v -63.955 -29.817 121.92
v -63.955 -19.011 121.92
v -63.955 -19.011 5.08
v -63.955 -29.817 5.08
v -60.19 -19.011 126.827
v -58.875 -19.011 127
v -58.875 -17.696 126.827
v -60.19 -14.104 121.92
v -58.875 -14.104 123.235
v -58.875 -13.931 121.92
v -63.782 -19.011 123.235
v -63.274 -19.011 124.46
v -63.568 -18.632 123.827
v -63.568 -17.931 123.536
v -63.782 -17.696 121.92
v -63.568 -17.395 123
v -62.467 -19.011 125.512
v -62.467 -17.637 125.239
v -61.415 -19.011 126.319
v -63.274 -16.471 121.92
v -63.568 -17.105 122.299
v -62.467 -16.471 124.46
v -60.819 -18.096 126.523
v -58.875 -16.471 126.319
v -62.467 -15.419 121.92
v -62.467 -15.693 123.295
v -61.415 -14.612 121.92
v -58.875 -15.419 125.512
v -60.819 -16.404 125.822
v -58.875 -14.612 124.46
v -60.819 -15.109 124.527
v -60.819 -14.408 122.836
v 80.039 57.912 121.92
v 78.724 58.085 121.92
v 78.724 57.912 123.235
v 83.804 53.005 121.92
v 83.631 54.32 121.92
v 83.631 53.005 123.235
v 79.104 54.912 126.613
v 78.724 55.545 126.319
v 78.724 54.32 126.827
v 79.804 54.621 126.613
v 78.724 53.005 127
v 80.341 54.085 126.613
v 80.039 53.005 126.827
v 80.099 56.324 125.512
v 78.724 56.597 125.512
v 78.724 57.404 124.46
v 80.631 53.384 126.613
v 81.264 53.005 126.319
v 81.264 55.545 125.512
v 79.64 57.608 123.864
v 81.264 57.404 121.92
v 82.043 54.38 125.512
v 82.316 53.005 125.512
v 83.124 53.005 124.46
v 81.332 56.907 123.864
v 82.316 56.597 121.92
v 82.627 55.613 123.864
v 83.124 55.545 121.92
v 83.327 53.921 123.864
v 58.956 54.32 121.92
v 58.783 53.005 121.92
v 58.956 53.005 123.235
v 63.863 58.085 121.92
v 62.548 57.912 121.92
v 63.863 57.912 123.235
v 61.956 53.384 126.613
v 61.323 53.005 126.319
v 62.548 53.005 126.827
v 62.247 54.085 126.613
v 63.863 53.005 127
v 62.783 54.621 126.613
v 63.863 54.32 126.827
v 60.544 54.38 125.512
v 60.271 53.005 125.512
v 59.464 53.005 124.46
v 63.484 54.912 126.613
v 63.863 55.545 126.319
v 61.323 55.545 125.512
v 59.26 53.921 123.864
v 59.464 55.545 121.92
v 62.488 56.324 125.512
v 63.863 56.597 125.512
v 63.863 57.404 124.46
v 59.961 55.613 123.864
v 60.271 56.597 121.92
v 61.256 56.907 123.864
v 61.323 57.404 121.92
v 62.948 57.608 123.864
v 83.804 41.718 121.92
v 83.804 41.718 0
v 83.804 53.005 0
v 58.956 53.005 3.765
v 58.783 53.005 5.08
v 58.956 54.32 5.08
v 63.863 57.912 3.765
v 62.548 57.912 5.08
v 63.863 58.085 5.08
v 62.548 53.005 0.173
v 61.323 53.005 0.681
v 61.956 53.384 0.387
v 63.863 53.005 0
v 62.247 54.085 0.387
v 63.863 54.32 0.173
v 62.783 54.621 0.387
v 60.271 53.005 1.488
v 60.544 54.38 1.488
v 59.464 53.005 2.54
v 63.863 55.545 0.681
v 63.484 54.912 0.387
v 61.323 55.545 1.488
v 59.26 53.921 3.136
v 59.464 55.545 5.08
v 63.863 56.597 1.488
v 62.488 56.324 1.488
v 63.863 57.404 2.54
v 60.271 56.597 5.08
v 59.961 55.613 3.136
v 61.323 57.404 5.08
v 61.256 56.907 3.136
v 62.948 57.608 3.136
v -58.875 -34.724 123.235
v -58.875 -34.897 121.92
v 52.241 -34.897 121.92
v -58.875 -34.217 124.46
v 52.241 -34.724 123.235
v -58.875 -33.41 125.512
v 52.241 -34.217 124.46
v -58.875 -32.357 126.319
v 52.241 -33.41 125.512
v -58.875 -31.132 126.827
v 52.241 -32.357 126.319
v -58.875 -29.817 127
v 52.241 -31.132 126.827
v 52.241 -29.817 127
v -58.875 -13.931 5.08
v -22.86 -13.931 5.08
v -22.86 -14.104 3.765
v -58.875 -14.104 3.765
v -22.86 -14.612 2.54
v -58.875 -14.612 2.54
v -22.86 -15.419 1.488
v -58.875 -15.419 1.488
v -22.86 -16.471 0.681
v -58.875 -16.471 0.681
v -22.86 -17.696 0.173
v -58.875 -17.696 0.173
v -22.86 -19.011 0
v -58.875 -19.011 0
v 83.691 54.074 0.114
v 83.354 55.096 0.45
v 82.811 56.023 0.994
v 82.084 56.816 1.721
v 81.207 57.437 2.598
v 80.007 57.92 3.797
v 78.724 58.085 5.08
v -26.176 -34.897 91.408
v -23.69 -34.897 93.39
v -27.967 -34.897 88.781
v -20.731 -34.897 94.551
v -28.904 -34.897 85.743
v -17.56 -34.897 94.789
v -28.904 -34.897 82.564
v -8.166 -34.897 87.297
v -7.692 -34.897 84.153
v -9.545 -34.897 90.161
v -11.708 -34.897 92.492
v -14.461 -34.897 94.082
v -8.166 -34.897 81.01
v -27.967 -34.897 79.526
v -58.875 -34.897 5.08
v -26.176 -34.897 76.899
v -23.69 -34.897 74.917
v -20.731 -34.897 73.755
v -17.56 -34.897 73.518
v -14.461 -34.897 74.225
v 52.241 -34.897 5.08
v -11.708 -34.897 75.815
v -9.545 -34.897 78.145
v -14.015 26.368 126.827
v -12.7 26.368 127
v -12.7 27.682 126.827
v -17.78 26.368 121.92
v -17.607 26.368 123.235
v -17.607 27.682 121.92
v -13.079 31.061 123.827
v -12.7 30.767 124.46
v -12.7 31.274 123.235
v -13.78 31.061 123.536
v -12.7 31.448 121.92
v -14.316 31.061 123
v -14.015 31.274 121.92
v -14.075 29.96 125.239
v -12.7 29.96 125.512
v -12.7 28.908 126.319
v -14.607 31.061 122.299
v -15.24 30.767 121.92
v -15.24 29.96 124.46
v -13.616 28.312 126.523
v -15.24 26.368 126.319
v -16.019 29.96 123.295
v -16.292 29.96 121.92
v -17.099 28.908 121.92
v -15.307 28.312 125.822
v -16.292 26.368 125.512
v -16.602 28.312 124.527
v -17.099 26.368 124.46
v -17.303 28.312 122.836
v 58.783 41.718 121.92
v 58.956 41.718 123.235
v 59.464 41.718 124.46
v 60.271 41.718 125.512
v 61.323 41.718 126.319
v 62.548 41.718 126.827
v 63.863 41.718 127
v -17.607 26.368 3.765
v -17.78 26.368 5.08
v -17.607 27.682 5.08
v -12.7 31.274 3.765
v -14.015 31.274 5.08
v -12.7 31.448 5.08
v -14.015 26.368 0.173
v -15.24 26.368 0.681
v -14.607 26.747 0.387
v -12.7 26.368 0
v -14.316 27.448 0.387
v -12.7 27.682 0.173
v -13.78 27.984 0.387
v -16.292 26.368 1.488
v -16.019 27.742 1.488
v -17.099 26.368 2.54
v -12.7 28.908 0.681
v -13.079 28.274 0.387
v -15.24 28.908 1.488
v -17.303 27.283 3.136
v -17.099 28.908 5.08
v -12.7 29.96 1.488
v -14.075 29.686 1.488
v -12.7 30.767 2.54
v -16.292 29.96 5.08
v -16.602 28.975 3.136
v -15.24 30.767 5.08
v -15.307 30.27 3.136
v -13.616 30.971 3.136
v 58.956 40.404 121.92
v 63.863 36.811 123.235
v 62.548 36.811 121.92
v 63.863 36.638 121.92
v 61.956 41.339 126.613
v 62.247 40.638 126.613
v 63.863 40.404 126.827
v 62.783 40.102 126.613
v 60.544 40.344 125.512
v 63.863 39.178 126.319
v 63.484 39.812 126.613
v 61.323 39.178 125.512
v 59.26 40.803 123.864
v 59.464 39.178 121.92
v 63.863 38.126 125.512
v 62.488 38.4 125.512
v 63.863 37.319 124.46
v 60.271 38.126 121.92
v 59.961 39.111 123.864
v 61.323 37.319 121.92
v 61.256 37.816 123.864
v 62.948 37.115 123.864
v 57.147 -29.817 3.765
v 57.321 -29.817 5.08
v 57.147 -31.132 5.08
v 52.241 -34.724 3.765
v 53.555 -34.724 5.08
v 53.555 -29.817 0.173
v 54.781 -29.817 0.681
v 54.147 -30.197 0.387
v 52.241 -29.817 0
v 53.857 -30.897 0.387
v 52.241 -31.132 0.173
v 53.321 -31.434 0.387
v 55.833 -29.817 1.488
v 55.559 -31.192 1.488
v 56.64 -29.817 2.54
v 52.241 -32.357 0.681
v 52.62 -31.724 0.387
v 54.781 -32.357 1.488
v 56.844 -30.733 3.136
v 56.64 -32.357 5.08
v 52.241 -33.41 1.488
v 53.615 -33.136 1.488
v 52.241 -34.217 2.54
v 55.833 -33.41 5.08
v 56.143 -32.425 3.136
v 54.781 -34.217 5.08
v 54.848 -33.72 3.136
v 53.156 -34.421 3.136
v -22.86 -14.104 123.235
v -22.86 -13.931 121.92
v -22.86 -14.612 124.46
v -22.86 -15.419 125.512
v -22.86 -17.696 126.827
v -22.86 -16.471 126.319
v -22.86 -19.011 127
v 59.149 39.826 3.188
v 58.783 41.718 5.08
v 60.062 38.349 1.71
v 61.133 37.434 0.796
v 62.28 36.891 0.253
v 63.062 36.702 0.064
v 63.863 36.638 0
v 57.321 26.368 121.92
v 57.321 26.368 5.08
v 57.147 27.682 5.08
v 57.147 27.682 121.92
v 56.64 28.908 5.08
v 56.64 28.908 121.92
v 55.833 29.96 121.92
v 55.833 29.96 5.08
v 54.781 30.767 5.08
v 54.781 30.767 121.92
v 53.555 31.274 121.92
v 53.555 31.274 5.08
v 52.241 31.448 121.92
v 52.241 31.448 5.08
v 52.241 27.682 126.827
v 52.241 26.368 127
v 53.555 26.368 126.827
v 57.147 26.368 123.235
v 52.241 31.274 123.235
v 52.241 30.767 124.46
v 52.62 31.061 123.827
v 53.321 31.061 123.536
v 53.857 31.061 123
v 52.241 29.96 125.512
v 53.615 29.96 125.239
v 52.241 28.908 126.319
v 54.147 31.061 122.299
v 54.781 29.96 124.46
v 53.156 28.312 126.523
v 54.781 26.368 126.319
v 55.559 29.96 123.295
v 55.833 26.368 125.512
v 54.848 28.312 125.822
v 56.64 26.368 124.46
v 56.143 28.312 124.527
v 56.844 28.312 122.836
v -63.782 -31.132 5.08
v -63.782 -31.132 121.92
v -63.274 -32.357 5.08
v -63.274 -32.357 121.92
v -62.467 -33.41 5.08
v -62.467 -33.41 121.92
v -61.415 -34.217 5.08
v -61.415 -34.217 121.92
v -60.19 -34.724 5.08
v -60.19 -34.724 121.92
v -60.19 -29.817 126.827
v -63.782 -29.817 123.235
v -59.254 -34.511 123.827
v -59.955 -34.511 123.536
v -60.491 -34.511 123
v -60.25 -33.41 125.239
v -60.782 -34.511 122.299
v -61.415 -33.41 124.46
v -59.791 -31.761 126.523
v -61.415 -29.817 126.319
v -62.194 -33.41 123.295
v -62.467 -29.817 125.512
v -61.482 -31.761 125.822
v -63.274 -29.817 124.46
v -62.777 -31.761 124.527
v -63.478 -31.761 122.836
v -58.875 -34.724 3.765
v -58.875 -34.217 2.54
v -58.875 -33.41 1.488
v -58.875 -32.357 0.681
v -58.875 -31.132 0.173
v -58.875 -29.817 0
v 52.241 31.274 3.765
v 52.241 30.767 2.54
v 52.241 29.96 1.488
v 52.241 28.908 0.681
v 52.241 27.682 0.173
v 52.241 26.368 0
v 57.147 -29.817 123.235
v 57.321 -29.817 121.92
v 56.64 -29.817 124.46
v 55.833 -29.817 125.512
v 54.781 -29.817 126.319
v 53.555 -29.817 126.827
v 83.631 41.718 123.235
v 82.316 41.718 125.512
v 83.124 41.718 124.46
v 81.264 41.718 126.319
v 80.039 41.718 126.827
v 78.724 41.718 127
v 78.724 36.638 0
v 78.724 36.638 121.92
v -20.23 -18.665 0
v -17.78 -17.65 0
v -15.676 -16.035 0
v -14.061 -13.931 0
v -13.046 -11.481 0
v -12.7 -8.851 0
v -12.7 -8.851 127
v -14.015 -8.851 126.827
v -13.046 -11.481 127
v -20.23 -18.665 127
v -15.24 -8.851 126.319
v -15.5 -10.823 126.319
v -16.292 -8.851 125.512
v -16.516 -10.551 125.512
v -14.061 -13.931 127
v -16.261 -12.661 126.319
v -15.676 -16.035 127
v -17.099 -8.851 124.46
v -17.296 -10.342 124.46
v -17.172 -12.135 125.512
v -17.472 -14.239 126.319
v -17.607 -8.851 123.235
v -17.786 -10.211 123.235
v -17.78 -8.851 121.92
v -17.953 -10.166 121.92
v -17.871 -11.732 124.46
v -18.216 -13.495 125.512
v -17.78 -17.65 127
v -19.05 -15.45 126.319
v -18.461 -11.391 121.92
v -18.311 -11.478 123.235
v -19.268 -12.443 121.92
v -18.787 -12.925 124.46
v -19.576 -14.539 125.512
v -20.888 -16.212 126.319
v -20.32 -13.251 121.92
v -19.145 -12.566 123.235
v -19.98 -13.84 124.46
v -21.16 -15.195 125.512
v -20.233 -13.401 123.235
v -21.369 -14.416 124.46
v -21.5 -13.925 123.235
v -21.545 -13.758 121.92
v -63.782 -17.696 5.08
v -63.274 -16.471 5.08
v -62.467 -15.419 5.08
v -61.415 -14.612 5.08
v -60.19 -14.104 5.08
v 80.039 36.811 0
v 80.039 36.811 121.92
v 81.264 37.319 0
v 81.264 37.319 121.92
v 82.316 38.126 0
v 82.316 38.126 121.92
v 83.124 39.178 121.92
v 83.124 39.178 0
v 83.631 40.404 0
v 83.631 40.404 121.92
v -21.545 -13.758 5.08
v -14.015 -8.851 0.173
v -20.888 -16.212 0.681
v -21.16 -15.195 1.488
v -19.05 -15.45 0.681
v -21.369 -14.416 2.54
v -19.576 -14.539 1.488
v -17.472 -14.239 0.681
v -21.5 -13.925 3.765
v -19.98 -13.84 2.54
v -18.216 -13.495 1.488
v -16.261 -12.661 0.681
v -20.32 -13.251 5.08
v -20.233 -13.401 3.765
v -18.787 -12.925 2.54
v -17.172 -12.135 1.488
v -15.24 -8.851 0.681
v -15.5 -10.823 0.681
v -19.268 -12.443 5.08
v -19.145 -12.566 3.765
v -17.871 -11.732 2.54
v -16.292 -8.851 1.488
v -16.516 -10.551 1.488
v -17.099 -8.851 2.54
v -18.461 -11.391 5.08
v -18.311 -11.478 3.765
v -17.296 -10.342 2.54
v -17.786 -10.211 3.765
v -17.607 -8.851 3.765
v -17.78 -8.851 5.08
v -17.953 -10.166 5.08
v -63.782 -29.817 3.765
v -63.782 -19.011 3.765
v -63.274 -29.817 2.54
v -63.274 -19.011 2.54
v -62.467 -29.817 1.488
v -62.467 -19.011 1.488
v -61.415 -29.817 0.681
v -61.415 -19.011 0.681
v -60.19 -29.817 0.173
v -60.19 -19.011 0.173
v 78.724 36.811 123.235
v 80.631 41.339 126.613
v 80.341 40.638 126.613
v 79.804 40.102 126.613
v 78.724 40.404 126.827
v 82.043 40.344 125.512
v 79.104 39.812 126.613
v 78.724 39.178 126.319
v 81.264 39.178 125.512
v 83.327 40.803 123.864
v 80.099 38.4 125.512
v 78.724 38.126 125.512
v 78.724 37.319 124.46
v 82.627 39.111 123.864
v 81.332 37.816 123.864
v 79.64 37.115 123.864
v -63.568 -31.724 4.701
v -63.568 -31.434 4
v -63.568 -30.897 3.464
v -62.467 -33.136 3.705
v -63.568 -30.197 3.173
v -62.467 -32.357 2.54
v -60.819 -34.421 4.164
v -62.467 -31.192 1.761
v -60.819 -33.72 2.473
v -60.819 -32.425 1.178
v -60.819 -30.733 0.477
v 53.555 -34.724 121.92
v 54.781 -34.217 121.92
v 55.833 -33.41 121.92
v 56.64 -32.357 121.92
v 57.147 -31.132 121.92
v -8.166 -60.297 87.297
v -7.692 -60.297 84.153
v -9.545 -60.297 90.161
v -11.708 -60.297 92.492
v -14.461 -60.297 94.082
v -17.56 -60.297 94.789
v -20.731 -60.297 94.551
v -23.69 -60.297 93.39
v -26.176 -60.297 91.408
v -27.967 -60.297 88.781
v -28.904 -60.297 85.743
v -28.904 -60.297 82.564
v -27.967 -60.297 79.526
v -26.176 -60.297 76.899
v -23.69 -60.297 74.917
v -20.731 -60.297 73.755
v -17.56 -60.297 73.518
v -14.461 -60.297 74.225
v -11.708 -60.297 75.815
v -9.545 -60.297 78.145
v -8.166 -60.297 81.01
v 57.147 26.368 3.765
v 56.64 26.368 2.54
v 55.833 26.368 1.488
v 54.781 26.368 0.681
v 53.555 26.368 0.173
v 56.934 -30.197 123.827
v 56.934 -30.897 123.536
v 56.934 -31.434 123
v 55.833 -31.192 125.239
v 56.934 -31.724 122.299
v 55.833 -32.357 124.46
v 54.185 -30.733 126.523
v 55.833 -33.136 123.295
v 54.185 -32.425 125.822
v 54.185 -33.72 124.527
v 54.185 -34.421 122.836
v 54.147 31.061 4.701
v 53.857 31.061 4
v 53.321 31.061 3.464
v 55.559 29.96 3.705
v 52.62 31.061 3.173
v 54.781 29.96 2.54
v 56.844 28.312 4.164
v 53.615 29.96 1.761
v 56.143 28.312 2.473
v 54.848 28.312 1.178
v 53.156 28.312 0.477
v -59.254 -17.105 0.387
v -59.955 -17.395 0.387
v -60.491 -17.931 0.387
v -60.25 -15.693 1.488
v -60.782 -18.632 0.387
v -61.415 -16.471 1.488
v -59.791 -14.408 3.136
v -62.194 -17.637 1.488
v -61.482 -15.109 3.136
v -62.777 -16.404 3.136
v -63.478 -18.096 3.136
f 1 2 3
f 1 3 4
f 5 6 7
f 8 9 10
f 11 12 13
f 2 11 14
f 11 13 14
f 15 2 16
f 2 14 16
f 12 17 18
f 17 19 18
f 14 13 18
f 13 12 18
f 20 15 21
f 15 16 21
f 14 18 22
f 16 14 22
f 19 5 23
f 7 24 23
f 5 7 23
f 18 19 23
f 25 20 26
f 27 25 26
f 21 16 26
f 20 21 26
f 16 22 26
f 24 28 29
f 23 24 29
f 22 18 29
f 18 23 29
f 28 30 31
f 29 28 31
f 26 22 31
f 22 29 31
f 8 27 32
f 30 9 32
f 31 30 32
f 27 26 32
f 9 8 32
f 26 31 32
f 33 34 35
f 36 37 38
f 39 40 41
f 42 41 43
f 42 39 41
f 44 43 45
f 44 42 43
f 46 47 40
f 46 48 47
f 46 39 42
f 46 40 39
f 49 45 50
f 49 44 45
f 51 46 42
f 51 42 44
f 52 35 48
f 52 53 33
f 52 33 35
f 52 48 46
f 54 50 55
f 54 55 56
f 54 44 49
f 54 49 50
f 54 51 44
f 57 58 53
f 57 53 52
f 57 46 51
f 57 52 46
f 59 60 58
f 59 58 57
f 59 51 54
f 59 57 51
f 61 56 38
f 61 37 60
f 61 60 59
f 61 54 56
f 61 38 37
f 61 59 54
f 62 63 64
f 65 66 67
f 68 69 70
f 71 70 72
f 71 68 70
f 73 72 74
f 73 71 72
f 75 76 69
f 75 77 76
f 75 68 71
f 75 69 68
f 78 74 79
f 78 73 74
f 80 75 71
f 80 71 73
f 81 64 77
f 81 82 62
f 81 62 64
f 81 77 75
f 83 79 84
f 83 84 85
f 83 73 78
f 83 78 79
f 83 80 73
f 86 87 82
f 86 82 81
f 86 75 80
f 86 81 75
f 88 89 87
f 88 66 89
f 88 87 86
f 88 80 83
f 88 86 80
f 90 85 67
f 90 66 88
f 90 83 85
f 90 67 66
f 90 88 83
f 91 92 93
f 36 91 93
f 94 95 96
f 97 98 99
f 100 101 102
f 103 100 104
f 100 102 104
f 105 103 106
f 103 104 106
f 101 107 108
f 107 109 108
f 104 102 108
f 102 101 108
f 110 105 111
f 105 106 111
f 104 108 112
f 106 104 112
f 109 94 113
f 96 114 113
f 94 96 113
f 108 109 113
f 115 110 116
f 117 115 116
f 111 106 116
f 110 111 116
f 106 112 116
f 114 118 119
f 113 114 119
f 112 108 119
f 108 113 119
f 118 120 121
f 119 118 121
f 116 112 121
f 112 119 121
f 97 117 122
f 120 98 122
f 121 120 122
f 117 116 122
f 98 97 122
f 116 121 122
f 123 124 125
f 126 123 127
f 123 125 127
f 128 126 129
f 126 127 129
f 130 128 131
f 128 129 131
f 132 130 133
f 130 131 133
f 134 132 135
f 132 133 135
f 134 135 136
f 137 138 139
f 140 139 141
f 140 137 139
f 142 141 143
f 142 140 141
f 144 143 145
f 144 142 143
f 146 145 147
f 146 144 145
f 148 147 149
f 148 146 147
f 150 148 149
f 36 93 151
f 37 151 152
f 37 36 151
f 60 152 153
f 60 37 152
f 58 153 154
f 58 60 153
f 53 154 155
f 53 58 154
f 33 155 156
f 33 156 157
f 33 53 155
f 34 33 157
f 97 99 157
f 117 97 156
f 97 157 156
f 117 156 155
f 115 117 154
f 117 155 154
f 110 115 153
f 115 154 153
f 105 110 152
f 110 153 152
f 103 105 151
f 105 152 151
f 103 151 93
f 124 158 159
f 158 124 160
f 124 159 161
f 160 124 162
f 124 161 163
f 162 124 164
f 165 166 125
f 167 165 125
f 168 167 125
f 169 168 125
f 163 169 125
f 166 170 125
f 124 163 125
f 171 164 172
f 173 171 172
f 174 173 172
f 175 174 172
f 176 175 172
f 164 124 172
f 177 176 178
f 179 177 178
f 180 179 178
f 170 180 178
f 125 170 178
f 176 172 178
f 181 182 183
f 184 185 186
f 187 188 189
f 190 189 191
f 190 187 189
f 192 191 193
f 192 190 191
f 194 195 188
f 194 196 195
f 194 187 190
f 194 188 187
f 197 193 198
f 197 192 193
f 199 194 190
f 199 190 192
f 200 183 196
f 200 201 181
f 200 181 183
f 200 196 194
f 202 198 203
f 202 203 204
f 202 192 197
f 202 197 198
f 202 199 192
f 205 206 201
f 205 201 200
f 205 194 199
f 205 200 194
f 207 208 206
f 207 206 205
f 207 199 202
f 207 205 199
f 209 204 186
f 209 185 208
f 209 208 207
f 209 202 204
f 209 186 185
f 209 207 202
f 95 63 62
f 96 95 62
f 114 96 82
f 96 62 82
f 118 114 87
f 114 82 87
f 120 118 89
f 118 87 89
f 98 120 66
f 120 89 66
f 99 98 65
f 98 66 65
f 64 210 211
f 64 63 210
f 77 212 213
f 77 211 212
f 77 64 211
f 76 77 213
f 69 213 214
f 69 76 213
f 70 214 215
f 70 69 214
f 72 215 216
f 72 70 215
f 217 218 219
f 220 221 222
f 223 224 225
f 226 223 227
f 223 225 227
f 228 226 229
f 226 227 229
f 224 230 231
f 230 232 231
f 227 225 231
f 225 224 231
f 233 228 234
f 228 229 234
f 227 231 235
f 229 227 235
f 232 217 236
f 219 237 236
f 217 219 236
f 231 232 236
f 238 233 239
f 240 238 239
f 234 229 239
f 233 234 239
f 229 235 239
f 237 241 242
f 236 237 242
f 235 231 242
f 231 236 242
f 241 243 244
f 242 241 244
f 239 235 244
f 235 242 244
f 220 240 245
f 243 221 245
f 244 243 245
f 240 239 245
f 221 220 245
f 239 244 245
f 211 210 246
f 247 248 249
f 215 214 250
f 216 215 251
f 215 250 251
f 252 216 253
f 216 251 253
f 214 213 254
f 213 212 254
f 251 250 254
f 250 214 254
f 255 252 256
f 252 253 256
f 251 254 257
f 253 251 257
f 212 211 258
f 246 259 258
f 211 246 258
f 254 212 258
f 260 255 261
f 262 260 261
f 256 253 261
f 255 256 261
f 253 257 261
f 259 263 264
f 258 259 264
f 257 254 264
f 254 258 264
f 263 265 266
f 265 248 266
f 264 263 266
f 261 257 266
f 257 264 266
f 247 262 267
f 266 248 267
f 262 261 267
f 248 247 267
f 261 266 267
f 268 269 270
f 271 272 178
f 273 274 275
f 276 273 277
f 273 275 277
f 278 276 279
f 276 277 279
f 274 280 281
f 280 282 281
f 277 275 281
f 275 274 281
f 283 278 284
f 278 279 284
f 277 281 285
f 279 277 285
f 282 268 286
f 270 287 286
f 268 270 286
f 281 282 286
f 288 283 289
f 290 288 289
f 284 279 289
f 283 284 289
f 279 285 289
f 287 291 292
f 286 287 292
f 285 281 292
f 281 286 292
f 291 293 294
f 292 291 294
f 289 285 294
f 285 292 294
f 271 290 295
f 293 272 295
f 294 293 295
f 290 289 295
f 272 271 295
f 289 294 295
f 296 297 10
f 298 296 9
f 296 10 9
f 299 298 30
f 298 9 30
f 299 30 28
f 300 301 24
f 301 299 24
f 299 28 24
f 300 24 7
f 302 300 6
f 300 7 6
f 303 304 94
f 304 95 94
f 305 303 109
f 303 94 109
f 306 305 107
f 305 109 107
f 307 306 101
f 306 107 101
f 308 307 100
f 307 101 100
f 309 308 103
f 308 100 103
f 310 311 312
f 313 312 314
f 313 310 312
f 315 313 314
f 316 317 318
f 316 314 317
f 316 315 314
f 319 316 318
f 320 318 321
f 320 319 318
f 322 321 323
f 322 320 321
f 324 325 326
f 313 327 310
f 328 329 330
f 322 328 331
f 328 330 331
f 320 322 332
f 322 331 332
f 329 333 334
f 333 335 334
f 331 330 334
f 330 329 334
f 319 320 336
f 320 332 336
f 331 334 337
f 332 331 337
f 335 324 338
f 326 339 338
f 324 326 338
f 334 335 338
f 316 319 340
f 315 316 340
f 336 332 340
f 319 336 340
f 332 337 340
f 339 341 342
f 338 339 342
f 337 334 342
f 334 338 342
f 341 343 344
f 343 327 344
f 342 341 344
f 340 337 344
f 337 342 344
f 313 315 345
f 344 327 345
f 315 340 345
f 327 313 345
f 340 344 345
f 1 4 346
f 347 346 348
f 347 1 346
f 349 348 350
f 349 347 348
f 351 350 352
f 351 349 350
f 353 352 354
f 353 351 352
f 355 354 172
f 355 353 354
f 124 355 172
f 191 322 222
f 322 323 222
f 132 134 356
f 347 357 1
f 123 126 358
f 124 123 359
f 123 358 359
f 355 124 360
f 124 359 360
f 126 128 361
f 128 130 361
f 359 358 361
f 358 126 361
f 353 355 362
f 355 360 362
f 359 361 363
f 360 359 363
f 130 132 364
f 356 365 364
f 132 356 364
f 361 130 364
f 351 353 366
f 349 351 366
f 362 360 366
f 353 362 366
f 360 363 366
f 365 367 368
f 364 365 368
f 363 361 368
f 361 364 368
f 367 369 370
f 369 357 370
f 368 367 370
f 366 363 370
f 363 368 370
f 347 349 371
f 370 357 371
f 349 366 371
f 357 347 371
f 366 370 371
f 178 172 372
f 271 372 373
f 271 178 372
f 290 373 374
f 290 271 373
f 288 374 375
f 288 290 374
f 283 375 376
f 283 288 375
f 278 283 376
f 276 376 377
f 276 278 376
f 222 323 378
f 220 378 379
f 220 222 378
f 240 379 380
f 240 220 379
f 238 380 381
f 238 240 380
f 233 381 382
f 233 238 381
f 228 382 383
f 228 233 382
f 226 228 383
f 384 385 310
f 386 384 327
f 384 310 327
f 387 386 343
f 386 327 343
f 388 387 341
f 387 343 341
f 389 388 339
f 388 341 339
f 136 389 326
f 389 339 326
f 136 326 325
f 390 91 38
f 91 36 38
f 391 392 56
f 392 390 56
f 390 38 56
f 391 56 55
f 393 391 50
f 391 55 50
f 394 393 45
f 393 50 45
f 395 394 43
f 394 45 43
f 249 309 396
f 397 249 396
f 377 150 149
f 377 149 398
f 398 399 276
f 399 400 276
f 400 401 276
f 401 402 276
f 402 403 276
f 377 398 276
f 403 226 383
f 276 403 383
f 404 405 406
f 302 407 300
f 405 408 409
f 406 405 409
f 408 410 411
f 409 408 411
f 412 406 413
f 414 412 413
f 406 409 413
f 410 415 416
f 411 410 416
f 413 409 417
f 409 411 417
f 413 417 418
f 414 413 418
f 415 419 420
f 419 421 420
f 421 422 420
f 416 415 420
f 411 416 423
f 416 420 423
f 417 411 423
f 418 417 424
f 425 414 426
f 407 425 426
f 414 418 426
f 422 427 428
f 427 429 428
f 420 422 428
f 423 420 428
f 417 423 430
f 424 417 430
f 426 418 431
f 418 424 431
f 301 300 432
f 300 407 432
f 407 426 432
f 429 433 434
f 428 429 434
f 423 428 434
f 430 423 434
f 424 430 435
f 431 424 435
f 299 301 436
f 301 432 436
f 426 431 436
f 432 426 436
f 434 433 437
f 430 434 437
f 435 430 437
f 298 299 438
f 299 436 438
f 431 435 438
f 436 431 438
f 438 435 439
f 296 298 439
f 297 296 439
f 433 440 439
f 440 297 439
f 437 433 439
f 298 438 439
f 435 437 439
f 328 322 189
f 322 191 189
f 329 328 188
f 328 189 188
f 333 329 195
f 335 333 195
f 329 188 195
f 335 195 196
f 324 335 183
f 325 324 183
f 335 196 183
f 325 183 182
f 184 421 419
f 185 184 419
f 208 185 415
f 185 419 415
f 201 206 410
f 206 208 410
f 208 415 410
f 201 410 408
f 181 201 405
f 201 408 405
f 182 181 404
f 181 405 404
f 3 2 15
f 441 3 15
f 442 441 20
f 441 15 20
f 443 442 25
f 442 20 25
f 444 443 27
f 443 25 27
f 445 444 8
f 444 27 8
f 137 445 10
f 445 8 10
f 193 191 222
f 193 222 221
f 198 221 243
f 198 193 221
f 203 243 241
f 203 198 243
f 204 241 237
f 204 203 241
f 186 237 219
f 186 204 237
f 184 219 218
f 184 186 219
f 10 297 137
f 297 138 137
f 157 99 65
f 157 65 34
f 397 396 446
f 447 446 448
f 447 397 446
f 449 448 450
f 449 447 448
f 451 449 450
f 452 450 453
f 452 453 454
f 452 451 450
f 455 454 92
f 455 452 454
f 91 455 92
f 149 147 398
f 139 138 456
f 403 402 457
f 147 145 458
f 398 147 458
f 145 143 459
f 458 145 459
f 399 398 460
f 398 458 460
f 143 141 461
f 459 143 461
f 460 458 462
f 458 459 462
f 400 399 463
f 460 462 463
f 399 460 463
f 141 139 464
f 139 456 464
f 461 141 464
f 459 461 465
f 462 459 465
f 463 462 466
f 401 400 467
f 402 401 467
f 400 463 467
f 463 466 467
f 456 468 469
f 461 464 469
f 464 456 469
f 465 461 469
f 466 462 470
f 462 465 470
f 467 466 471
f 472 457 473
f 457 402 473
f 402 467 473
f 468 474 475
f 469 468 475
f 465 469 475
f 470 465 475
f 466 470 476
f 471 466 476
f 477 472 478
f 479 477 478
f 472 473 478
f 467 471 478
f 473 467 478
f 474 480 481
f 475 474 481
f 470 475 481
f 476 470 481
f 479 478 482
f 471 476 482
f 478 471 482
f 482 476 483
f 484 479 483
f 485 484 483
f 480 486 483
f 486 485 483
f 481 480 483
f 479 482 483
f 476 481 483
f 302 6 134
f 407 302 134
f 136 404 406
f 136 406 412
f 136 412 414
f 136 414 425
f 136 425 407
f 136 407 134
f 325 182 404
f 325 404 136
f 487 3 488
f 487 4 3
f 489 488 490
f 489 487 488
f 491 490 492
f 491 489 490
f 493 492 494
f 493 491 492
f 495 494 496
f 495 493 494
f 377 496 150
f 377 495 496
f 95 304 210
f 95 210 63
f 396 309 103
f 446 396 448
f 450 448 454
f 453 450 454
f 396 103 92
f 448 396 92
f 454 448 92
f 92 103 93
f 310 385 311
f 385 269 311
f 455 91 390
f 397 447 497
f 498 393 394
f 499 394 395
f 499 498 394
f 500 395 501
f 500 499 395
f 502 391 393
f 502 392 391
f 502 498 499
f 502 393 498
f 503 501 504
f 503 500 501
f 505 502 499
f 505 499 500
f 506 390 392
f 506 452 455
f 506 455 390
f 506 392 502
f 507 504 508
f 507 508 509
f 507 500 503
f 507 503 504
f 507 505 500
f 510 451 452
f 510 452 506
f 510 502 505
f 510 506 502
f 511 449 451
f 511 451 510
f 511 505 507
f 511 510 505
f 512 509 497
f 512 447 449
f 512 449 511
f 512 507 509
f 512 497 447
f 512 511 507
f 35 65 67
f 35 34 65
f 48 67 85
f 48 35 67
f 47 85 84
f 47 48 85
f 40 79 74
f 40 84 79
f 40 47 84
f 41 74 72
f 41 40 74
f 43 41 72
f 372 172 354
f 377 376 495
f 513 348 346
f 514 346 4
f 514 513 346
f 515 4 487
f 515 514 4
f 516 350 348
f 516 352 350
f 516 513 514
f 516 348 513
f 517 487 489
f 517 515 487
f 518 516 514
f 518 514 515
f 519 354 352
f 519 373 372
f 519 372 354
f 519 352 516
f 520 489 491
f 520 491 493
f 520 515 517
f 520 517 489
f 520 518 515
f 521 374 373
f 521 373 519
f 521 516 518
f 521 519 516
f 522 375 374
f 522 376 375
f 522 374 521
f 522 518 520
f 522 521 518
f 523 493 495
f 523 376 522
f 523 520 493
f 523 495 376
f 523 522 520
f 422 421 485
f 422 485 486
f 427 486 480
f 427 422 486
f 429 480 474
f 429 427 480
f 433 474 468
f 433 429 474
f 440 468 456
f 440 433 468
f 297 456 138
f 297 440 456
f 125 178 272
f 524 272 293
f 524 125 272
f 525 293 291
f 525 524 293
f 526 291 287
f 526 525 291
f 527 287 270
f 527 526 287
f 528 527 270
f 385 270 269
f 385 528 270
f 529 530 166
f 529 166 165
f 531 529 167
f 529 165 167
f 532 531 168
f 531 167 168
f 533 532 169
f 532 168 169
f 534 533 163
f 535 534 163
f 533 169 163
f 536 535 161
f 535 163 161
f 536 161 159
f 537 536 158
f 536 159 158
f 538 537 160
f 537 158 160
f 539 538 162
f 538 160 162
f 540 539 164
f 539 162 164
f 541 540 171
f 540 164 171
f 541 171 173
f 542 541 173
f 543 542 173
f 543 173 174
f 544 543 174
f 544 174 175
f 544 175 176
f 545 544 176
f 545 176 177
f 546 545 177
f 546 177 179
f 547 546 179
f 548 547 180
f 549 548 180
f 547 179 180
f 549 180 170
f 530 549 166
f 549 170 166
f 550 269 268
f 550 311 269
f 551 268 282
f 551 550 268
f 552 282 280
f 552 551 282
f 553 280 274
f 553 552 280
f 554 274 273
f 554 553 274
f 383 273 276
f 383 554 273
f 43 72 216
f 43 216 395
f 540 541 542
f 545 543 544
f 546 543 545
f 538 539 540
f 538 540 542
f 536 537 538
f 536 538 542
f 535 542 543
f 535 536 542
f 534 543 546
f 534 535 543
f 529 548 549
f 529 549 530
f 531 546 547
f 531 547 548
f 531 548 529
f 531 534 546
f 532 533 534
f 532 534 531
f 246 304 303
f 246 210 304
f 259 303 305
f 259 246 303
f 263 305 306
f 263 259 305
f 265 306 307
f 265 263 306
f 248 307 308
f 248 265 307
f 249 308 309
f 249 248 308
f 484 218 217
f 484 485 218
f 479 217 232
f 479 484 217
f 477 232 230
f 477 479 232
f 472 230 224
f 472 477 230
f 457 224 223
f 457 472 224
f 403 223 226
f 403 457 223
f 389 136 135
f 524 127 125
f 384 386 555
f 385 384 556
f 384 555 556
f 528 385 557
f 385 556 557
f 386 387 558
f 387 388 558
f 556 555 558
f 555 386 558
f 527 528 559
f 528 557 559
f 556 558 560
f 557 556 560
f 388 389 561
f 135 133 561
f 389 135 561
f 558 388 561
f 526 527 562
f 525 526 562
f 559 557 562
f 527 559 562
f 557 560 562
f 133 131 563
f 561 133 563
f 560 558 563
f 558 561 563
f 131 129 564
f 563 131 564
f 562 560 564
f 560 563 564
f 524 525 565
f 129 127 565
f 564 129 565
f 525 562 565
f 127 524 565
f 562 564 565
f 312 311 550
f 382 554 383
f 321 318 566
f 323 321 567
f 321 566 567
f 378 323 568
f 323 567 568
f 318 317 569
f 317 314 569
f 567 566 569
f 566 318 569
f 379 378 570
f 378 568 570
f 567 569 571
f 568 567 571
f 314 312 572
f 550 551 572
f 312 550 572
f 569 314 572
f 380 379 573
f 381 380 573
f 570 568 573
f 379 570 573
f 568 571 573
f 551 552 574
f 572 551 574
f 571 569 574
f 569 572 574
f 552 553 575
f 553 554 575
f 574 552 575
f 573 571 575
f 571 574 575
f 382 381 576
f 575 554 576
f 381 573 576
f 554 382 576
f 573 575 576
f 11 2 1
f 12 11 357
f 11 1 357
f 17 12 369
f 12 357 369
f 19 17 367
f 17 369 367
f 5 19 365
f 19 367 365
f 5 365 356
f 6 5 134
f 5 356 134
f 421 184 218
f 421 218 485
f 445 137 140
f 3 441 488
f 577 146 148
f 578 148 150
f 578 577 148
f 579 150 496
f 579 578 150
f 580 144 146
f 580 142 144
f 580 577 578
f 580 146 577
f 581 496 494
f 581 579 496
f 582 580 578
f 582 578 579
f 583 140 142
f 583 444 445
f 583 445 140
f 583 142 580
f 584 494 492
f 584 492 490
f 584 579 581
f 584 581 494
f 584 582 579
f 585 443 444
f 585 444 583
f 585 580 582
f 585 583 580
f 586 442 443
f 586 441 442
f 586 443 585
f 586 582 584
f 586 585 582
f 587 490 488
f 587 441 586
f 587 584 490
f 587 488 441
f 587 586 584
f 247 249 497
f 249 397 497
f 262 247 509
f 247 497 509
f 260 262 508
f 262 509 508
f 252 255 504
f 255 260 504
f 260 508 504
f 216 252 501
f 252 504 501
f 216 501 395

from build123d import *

# Parameters (mm, degrees)
F0_W     = 25.021188
F0_H     = 21.446731
F1_DEPTH = 127
F2_R     = 5.08
F3_R     = 10.665523
F4_DEPTH = 25.4


with BuildPart() as f1:
    # F0 (on Top) → F1 (new body)
    with BuildSketch(Plane.XY):
        with Locations((71.29373, 47.361711)):
            Rectangle(F0_W, F0_H)
        Polygon((-63.954927, -13.93125), (-63.954927, -34.897407), (57.320595, -34.897407), (57.320595, 31.447557), (-17.78, 31.447557), (-17.78, -13.93125), align=None)
    extrude(amount=F1_DEPTH)

    # F2
    f2_edges = [f1.edges().sort_by_distance(p)[0] for p in [
        (-17.78, 8.758154, 127),
        (-40.867464, -13.93125, 127),
        (-63.954927, -24.414328, 127),
        (-3.317166, -34.897407, 127),
        (57.320595, -1.724925, 127),
        (19.770297, 31.447557, 127),
        (57.320595, -34.897407, 63.5),
        (57.320595, -1.724925, 0),
        (-3.317166, -34.897407, 0),
        (-63.954927, -34.897407, 63.5),
        (83.804324, 36.638346, 63.5),
        (83.804324, 58.085077, 63.5),
        (58.783136, 36.638346, 63.5),
        (58.783136, 58.085077, 63.5),
        (57.320595, 31.447557, 63.5),
        (-17.78, 31.447557, 63.5),
        (-17.78, -13.93125, 63.5),
        (-63.954927, -13.93125, 63.5),
        (-40.867464, -13.93125, 0),
        (-17.78, 8.758154, 0),
        (19.770297, 31.447557, 0),
        (58.783136, 47.361711, 0),
        (71.29373, 58.085077, 0),
        (-63.954927, -24.414328, 0),
        (58.783136, 47.361711, 127),
        (71.29373, 58.085077, 127),
        (83.804324, 47.361711, 127),
        (71.29373, 36.638346, 127),
    ]]
    fillet(f2_edges, radius=F2_R)

    # F3 (on face) → F4 (join)
    with BuildSketch(Plane.XZ.offset(34.897407)):
        with Locations((-18.357383, 84.153309)):
            Circle(F3_R)
    extrude(amount=F4_DEPTH)


solid = f1.part
